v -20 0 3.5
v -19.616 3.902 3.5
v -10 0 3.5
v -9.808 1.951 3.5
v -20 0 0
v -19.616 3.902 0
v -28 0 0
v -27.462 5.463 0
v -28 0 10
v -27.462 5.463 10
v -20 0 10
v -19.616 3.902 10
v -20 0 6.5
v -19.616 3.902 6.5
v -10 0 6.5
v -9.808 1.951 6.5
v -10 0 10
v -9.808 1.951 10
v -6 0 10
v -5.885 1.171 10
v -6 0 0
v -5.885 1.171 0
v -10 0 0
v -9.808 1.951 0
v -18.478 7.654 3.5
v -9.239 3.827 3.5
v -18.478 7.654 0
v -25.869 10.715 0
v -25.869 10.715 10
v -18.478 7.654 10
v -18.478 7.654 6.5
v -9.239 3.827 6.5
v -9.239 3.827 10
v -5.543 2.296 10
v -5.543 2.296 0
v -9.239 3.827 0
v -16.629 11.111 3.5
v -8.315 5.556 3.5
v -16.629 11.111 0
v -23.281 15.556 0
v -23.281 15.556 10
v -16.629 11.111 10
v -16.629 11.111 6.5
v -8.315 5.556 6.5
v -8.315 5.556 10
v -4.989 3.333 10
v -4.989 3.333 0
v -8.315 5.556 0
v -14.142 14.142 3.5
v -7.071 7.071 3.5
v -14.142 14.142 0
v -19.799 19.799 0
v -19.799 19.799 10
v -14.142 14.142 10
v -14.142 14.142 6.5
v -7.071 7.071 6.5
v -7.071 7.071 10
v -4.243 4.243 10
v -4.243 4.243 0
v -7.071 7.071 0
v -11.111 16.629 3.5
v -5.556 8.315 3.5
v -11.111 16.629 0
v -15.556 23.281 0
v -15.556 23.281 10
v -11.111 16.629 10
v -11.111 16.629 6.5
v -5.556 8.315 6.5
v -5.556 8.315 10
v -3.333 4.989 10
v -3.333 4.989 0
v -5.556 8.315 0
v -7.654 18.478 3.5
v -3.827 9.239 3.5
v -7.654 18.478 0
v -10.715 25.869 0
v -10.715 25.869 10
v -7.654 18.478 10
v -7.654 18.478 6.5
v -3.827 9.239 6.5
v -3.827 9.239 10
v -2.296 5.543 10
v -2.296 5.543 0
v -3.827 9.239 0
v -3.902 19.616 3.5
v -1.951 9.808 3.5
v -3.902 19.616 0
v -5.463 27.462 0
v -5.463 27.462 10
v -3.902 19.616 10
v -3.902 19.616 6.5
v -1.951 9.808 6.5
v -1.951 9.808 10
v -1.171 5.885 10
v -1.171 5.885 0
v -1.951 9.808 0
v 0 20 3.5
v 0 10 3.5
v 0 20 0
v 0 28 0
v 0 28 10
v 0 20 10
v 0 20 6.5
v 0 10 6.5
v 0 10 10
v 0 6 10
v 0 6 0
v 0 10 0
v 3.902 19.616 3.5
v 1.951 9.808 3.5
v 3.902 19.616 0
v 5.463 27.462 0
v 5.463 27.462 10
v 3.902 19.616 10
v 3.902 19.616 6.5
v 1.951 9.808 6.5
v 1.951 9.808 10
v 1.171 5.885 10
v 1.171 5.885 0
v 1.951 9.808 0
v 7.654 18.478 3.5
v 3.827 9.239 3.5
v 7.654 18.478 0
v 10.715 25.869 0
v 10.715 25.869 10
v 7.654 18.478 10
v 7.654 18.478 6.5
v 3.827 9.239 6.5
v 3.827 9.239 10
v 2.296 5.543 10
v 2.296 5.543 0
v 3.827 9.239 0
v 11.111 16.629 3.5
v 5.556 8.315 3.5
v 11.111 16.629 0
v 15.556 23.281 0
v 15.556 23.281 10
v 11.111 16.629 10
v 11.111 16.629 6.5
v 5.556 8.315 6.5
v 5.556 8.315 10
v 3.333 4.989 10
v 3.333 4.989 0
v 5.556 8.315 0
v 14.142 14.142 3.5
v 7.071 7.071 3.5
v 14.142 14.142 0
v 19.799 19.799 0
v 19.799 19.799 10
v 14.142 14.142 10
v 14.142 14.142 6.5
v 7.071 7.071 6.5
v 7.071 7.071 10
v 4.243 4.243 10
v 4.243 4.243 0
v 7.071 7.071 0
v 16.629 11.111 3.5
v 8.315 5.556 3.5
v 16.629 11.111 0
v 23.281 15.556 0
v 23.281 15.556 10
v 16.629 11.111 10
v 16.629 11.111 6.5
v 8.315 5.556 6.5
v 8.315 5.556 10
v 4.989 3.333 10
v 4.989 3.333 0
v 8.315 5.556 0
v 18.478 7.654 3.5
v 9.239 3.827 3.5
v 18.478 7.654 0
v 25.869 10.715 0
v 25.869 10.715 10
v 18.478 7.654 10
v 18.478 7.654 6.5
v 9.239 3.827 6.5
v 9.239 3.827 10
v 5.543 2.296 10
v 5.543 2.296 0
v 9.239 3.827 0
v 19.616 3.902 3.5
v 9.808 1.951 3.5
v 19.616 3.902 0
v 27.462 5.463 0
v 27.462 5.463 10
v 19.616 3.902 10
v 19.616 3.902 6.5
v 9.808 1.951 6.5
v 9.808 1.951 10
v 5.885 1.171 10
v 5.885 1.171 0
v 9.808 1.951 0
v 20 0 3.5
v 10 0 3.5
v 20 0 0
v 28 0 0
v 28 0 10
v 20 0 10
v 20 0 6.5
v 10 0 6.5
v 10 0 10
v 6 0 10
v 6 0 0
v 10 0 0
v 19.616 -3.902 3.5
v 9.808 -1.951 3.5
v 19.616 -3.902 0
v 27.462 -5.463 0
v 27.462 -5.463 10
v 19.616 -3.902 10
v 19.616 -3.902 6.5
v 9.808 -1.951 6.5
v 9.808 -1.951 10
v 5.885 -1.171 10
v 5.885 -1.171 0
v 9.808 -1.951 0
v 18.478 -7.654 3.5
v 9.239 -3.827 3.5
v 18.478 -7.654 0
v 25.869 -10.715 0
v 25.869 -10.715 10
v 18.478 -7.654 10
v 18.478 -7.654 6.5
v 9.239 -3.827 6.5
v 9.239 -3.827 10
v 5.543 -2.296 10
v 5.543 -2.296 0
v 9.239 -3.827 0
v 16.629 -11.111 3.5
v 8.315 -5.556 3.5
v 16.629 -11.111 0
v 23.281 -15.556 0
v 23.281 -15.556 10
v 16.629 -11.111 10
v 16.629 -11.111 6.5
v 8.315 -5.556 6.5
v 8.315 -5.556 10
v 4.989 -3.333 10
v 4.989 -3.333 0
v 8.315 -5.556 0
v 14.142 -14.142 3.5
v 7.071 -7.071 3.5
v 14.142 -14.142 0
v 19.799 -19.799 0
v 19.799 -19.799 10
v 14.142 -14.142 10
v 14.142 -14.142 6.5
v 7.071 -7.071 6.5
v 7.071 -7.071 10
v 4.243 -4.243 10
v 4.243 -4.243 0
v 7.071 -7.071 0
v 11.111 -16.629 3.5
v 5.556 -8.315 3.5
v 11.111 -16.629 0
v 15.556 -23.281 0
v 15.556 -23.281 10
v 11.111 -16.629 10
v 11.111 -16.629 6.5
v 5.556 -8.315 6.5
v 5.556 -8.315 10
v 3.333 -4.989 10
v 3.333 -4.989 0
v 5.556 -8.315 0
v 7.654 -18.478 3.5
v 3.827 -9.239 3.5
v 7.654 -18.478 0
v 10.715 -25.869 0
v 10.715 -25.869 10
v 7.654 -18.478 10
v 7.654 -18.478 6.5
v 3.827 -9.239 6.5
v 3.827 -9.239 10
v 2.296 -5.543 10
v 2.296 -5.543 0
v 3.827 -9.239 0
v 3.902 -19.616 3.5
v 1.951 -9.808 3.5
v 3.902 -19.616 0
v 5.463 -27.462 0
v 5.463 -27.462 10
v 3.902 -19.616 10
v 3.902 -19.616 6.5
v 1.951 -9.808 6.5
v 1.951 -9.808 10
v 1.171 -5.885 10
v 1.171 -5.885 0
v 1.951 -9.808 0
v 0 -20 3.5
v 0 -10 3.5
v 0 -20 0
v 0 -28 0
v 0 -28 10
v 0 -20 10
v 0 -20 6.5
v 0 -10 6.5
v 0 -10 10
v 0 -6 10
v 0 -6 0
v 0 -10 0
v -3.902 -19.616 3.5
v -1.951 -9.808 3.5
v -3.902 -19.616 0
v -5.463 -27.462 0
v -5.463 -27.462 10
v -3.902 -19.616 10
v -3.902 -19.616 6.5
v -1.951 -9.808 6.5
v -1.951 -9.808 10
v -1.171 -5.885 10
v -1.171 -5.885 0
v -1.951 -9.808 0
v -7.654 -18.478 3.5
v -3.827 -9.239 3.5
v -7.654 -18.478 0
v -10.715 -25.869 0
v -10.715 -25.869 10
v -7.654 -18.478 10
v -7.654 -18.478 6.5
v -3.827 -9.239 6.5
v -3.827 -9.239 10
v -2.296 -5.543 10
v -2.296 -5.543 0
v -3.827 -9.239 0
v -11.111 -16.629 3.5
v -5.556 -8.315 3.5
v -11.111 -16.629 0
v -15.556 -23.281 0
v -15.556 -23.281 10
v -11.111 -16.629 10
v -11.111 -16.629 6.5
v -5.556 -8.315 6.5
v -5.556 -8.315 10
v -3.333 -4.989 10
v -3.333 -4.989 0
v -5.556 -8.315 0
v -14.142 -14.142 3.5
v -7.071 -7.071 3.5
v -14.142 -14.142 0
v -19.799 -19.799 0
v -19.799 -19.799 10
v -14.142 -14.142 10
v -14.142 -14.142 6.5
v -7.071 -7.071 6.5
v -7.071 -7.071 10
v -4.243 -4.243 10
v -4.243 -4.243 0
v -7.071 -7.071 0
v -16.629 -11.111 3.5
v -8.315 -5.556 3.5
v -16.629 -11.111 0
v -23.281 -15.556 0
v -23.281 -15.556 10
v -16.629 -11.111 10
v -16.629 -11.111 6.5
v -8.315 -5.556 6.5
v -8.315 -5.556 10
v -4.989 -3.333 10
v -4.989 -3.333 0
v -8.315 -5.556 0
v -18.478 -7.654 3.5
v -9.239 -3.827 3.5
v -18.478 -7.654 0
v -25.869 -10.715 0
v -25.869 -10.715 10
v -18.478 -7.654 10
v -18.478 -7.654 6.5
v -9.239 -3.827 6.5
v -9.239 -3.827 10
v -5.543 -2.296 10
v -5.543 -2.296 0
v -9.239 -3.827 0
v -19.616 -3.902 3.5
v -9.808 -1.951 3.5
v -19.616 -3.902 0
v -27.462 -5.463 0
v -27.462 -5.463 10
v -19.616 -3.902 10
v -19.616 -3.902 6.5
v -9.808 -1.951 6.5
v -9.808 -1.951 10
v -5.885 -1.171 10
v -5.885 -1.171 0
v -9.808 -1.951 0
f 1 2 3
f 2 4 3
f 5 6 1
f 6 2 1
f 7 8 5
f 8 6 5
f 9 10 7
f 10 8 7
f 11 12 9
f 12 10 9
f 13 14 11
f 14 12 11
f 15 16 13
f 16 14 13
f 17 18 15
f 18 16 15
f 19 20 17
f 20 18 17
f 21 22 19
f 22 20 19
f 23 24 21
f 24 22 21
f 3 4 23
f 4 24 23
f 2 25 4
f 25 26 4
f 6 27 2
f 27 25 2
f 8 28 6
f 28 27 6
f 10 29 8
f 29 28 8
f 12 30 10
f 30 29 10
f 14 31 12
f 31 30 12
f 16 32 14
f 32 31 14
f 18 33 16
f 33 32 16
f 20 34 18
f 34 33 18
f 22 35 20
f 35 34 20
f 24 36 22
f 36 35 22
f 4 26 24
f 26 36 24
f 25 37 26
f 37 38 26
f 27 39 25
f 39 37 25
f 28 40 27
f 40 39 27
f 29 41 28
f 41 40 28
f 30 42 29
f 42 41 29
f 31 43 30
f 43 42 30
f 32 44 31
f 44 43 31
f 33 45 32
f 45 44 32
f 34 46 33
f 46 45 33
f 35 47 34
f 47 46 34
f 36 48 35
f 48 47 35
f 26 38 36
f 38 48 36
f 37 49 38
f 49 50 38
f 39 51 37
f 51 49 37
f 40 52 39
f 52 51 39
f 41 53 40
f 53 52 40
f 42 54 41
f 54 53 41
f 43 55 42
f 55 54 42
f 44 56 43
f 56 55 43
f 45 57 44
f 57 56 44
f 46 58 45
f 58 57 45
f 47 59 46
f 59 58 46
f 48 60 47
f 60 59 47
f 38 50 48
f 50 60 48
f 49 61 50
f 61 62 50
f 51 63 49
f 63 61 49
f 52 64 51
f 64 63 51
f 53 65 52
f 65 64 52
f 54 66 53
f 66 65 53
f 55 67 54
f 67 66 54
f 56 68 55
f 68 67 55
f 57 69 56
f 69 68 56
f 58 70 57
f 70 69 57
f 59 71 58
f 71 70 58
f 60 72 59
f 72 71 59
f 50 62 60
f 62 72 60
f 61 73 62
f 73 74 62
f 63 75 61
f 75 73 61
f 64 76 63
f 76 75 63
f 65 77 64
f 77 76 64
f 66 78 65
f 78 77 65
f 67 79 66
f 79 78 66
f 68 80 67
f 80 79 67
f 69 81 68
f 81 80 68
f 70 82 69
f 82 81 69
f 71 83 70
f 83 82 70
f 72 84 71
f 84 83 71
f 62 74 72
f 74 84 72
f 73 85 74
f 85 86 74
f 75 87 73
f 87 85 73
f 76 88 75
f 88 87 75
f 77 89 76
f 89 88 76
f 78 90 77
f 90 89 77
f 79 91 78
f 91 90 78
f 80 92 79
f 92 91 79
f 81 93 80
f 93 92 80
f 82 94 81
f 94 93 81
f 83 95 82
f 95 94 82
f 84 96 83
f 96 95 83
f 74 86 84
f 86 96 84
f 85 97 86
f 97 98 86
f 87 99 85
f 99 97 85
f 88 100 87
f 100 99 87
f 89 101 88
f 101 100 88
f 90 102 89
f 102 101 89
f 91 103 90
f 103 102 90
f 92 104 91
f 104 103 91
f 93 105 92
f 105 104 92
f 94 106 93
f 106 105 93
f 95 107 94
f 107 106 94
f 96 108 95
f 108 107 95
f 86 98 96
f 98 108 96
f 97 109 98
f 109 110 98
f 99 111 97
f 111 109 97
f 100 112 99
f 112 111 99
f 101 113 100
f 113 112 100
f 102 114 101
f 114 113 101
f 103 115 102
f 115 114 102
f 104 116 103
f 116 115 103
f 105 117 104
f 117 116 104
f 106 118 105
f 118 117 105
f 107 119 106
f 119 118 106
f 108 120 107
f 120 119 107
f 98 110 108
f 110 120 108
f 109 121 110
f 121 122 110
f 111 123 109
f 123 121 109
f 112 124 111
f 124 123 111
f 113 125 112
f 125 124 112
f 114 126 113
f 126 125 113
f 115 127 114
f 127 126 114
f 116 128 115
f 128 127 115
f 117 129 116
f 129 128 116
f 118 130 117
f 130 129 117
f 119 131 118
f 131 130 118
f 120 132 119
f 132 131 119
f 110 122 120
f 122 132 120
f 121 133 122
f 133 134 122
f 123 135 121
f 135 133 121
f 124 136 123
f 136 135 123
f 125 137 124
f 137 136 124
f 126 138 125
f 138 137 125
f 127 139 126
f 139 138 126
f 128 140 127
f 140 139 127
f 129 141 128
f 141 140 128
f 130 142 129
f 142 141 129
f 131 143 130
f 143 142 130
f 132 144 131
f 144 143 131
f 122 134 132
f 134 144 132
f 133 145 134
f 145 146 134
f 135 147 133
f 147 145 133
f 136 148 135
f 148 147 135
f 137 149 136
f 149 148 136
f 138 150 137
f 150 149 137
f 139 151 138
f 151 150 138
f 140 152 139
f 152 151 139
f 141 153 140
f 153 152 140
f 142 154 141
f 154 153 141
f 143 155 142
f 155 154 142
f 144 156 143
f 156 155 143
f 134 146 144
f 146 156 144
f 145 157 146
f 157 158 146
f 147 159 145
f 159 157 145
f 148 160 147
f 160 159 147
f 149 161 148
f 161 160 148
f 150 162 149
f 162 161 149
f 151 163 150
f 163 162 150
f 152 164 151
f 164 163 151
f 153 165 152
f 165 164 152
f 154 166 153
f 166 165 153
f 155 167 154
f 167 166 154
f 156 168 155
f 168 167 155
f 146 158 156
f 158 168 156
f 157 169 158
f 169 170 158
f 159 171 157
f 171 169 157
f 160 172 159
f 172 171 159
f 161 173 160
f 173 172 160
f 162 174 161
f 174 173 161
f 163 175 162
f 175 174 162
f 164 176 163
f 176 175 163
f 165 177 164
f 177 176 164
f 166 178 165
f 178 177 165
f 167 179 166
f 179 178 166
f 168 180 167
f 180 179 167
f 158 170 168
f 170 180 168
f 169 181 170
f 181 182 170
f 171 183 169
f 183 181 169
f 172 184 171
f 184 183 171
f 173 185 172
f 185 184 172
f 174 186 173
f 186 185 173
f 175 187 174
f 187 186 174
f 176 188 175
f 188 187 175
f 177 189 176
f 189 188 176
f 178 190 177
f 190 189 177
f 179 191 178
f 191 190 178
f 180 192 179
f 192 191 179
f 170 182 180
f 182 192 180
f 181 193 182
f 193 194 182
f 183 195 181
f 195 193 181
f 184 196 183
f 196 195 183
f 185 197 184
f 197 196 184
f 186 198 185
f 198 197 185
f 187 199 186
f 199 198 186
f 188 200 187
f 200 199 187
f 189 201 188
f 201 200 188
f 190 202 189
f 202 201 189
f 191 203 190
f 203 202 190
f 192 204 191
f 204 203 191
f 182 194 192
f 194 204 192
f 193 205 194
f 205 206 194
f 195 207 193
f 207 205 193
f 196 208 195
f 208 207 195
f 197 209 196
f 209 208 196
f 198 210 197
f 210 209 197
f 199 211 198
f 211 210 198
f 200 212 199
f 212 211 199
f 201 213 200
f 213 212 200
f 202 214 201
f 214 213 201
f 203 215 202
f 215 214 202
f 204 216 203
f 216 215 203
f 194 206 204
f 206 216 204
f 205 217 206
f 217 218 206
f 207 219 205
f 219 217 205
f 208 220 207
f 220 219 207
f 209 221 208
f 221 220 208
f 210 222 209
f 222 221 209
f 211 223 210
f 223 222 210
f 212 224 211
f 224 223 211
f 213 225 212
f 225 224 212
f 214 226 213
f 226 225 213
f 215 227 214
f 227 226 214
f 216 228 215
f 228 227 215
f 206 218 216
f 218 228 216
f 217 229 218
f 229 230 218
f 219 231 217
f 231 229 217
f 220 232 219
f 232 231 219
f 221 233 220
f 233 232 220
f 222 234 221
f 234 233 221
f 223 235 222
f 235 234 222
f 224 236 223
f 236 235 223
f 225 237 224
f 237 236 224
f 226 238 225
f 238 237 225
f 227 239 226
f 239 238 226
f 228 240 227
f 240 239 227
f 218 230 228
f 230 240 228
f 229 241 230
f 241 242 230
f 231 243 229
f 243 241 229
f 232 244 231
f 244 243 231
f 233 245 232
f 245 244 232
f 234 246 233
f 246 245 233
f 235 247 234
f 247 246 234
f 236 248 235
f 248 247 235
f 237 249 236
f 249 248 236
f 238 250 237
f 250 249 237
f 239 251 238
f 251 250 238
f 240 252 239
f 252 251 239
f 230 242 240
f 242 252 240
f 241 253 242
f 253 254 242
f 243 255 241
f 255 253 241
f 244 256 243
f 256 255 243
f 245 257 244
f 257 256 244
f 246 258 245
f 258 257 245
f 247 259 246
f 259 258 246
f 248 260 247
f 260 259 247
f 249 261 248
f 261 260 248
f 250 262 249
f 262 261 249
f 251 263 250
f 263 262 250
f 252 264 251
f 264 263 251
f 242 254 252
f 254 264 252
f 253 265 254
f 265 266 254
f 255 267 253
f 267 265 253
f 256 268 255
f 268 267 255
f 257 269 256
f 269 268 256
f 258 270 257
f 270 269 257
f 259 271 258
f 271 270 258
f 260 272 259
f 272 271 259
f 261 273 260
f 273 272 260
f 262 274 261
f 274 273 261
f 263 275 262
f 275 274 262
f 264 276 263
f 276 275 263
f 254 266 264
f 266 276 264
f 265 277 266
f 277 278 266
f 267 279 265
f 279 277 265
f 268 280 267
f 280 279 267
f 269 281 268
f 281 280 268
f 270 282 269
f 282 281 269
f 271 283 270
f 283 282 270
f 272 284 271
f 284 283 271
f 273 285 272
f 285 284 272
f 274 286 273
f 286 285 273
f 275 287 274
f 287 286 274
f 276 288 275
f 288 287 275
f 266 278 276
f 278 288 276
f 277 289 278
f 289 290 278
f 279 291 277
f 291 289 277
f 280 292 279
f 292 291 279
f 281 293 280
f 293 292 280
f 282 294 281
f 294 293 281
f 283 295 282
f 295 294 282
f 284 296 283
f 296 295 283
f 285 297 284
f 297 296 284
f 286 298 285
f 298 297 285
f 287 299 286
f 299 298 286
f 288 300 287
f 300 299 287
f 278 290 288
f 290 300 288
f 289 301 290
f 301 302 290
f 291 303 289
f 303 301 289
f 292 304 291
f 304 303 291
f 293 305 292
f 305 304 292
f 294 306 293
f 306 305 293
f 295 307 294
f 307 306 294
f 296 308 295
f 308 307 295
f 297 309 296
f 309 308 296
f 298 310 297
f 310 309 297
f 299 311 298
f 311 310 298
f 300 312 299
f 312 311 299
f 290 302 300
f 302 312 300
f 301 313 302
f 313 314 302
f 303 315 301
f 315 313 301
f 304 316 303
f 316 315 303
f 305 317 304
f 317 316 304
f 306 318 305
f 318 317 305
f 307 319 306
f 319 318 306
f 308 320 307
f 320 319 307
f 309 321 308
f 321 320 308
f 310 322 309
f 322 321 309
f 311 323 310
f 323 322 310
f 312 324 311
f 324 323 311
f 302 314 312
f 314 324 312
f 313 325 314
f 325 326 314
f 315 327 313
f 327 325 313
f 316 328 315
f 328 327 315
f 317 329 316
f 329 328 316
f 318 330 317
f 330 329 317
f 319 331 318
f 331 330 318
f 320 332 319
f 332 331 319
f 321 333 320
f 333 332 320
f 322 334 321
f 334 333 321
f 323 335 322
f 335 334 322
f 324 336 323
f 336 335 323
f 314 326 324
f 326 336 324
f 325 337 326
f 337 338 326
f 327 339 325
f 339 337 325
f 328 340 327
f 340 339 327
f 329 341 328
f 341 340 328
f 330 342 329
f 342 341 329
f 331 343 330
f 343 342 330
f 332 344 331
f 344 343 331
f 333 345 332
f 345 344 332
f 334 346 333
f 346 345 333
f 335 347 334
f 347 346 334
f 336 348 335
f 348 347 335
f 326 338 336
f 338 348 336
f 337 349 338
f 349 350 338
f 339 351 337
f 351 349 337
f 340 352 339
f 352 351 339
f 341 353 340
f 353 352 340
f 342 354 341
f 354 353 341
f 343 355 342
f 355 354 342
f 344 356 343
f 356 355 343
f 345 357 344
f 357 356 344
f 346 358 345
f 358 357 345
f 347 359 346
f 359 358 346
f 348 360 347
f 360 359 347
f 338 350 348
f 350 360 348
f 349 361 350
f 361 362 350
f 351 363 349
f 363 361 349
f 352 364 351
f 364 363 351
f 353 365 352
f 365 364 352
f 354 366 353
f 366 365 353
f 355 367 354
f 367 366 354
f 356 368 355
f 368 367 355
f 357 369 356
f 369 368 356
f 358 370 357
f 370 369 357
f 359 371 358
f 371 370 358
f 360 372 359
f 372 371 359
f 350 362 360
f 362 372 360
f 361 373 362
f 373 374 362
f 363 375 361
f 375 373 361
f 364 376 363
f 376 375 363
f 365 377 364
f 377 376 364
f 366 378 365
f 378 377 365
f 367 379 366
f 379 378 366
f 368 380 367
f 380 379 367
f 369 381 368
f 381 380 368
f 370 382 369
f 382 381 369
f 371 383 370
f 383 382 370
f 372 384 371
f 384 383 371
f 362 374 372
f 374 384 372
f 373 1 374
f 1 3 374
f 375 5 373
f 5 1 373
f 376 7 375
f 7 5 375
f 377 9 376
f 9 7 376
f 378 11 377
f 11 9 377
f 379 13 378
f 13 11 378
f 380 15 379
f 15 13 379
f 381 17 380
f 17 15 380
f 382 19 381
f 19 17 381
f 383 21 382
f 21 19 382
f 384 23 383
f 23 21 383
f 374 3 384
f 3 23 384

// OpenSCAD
$fn = 32;

// ----------------------------------------------------------------------
// Revolved part: handwheel R28
// ----------------------------------------------------------------------

// --- parameters (mm) ---
bore_r = 6;               // bore radius
rim_r = 28;               // rim radius
rim_w = 8;                // rim axial width
rim_t = 10;               // rim diameter height
hub_r = 10;               // hub radius
web_t = 3;                // web thickness
revolve_angle = 360;      // revolve sweep, degrees

bore_d = 2 * bore_r;
rim_d = 2 * rim_r;
hub_d = 2 * hub_r;

profile = [[6, 0], [10, 0], [10, 3.5], [20, 3.5], [20, 0], [28, 0], [28, 10], [20, 10], [20, 6.5], [10, 6.5], [10, 10], [6, 10]];  // primary outline, 12 points, counter clockwise

// --- the one profile operation ---
rotate_extrude(angle = revolve_angle) polygon(points = profile);
